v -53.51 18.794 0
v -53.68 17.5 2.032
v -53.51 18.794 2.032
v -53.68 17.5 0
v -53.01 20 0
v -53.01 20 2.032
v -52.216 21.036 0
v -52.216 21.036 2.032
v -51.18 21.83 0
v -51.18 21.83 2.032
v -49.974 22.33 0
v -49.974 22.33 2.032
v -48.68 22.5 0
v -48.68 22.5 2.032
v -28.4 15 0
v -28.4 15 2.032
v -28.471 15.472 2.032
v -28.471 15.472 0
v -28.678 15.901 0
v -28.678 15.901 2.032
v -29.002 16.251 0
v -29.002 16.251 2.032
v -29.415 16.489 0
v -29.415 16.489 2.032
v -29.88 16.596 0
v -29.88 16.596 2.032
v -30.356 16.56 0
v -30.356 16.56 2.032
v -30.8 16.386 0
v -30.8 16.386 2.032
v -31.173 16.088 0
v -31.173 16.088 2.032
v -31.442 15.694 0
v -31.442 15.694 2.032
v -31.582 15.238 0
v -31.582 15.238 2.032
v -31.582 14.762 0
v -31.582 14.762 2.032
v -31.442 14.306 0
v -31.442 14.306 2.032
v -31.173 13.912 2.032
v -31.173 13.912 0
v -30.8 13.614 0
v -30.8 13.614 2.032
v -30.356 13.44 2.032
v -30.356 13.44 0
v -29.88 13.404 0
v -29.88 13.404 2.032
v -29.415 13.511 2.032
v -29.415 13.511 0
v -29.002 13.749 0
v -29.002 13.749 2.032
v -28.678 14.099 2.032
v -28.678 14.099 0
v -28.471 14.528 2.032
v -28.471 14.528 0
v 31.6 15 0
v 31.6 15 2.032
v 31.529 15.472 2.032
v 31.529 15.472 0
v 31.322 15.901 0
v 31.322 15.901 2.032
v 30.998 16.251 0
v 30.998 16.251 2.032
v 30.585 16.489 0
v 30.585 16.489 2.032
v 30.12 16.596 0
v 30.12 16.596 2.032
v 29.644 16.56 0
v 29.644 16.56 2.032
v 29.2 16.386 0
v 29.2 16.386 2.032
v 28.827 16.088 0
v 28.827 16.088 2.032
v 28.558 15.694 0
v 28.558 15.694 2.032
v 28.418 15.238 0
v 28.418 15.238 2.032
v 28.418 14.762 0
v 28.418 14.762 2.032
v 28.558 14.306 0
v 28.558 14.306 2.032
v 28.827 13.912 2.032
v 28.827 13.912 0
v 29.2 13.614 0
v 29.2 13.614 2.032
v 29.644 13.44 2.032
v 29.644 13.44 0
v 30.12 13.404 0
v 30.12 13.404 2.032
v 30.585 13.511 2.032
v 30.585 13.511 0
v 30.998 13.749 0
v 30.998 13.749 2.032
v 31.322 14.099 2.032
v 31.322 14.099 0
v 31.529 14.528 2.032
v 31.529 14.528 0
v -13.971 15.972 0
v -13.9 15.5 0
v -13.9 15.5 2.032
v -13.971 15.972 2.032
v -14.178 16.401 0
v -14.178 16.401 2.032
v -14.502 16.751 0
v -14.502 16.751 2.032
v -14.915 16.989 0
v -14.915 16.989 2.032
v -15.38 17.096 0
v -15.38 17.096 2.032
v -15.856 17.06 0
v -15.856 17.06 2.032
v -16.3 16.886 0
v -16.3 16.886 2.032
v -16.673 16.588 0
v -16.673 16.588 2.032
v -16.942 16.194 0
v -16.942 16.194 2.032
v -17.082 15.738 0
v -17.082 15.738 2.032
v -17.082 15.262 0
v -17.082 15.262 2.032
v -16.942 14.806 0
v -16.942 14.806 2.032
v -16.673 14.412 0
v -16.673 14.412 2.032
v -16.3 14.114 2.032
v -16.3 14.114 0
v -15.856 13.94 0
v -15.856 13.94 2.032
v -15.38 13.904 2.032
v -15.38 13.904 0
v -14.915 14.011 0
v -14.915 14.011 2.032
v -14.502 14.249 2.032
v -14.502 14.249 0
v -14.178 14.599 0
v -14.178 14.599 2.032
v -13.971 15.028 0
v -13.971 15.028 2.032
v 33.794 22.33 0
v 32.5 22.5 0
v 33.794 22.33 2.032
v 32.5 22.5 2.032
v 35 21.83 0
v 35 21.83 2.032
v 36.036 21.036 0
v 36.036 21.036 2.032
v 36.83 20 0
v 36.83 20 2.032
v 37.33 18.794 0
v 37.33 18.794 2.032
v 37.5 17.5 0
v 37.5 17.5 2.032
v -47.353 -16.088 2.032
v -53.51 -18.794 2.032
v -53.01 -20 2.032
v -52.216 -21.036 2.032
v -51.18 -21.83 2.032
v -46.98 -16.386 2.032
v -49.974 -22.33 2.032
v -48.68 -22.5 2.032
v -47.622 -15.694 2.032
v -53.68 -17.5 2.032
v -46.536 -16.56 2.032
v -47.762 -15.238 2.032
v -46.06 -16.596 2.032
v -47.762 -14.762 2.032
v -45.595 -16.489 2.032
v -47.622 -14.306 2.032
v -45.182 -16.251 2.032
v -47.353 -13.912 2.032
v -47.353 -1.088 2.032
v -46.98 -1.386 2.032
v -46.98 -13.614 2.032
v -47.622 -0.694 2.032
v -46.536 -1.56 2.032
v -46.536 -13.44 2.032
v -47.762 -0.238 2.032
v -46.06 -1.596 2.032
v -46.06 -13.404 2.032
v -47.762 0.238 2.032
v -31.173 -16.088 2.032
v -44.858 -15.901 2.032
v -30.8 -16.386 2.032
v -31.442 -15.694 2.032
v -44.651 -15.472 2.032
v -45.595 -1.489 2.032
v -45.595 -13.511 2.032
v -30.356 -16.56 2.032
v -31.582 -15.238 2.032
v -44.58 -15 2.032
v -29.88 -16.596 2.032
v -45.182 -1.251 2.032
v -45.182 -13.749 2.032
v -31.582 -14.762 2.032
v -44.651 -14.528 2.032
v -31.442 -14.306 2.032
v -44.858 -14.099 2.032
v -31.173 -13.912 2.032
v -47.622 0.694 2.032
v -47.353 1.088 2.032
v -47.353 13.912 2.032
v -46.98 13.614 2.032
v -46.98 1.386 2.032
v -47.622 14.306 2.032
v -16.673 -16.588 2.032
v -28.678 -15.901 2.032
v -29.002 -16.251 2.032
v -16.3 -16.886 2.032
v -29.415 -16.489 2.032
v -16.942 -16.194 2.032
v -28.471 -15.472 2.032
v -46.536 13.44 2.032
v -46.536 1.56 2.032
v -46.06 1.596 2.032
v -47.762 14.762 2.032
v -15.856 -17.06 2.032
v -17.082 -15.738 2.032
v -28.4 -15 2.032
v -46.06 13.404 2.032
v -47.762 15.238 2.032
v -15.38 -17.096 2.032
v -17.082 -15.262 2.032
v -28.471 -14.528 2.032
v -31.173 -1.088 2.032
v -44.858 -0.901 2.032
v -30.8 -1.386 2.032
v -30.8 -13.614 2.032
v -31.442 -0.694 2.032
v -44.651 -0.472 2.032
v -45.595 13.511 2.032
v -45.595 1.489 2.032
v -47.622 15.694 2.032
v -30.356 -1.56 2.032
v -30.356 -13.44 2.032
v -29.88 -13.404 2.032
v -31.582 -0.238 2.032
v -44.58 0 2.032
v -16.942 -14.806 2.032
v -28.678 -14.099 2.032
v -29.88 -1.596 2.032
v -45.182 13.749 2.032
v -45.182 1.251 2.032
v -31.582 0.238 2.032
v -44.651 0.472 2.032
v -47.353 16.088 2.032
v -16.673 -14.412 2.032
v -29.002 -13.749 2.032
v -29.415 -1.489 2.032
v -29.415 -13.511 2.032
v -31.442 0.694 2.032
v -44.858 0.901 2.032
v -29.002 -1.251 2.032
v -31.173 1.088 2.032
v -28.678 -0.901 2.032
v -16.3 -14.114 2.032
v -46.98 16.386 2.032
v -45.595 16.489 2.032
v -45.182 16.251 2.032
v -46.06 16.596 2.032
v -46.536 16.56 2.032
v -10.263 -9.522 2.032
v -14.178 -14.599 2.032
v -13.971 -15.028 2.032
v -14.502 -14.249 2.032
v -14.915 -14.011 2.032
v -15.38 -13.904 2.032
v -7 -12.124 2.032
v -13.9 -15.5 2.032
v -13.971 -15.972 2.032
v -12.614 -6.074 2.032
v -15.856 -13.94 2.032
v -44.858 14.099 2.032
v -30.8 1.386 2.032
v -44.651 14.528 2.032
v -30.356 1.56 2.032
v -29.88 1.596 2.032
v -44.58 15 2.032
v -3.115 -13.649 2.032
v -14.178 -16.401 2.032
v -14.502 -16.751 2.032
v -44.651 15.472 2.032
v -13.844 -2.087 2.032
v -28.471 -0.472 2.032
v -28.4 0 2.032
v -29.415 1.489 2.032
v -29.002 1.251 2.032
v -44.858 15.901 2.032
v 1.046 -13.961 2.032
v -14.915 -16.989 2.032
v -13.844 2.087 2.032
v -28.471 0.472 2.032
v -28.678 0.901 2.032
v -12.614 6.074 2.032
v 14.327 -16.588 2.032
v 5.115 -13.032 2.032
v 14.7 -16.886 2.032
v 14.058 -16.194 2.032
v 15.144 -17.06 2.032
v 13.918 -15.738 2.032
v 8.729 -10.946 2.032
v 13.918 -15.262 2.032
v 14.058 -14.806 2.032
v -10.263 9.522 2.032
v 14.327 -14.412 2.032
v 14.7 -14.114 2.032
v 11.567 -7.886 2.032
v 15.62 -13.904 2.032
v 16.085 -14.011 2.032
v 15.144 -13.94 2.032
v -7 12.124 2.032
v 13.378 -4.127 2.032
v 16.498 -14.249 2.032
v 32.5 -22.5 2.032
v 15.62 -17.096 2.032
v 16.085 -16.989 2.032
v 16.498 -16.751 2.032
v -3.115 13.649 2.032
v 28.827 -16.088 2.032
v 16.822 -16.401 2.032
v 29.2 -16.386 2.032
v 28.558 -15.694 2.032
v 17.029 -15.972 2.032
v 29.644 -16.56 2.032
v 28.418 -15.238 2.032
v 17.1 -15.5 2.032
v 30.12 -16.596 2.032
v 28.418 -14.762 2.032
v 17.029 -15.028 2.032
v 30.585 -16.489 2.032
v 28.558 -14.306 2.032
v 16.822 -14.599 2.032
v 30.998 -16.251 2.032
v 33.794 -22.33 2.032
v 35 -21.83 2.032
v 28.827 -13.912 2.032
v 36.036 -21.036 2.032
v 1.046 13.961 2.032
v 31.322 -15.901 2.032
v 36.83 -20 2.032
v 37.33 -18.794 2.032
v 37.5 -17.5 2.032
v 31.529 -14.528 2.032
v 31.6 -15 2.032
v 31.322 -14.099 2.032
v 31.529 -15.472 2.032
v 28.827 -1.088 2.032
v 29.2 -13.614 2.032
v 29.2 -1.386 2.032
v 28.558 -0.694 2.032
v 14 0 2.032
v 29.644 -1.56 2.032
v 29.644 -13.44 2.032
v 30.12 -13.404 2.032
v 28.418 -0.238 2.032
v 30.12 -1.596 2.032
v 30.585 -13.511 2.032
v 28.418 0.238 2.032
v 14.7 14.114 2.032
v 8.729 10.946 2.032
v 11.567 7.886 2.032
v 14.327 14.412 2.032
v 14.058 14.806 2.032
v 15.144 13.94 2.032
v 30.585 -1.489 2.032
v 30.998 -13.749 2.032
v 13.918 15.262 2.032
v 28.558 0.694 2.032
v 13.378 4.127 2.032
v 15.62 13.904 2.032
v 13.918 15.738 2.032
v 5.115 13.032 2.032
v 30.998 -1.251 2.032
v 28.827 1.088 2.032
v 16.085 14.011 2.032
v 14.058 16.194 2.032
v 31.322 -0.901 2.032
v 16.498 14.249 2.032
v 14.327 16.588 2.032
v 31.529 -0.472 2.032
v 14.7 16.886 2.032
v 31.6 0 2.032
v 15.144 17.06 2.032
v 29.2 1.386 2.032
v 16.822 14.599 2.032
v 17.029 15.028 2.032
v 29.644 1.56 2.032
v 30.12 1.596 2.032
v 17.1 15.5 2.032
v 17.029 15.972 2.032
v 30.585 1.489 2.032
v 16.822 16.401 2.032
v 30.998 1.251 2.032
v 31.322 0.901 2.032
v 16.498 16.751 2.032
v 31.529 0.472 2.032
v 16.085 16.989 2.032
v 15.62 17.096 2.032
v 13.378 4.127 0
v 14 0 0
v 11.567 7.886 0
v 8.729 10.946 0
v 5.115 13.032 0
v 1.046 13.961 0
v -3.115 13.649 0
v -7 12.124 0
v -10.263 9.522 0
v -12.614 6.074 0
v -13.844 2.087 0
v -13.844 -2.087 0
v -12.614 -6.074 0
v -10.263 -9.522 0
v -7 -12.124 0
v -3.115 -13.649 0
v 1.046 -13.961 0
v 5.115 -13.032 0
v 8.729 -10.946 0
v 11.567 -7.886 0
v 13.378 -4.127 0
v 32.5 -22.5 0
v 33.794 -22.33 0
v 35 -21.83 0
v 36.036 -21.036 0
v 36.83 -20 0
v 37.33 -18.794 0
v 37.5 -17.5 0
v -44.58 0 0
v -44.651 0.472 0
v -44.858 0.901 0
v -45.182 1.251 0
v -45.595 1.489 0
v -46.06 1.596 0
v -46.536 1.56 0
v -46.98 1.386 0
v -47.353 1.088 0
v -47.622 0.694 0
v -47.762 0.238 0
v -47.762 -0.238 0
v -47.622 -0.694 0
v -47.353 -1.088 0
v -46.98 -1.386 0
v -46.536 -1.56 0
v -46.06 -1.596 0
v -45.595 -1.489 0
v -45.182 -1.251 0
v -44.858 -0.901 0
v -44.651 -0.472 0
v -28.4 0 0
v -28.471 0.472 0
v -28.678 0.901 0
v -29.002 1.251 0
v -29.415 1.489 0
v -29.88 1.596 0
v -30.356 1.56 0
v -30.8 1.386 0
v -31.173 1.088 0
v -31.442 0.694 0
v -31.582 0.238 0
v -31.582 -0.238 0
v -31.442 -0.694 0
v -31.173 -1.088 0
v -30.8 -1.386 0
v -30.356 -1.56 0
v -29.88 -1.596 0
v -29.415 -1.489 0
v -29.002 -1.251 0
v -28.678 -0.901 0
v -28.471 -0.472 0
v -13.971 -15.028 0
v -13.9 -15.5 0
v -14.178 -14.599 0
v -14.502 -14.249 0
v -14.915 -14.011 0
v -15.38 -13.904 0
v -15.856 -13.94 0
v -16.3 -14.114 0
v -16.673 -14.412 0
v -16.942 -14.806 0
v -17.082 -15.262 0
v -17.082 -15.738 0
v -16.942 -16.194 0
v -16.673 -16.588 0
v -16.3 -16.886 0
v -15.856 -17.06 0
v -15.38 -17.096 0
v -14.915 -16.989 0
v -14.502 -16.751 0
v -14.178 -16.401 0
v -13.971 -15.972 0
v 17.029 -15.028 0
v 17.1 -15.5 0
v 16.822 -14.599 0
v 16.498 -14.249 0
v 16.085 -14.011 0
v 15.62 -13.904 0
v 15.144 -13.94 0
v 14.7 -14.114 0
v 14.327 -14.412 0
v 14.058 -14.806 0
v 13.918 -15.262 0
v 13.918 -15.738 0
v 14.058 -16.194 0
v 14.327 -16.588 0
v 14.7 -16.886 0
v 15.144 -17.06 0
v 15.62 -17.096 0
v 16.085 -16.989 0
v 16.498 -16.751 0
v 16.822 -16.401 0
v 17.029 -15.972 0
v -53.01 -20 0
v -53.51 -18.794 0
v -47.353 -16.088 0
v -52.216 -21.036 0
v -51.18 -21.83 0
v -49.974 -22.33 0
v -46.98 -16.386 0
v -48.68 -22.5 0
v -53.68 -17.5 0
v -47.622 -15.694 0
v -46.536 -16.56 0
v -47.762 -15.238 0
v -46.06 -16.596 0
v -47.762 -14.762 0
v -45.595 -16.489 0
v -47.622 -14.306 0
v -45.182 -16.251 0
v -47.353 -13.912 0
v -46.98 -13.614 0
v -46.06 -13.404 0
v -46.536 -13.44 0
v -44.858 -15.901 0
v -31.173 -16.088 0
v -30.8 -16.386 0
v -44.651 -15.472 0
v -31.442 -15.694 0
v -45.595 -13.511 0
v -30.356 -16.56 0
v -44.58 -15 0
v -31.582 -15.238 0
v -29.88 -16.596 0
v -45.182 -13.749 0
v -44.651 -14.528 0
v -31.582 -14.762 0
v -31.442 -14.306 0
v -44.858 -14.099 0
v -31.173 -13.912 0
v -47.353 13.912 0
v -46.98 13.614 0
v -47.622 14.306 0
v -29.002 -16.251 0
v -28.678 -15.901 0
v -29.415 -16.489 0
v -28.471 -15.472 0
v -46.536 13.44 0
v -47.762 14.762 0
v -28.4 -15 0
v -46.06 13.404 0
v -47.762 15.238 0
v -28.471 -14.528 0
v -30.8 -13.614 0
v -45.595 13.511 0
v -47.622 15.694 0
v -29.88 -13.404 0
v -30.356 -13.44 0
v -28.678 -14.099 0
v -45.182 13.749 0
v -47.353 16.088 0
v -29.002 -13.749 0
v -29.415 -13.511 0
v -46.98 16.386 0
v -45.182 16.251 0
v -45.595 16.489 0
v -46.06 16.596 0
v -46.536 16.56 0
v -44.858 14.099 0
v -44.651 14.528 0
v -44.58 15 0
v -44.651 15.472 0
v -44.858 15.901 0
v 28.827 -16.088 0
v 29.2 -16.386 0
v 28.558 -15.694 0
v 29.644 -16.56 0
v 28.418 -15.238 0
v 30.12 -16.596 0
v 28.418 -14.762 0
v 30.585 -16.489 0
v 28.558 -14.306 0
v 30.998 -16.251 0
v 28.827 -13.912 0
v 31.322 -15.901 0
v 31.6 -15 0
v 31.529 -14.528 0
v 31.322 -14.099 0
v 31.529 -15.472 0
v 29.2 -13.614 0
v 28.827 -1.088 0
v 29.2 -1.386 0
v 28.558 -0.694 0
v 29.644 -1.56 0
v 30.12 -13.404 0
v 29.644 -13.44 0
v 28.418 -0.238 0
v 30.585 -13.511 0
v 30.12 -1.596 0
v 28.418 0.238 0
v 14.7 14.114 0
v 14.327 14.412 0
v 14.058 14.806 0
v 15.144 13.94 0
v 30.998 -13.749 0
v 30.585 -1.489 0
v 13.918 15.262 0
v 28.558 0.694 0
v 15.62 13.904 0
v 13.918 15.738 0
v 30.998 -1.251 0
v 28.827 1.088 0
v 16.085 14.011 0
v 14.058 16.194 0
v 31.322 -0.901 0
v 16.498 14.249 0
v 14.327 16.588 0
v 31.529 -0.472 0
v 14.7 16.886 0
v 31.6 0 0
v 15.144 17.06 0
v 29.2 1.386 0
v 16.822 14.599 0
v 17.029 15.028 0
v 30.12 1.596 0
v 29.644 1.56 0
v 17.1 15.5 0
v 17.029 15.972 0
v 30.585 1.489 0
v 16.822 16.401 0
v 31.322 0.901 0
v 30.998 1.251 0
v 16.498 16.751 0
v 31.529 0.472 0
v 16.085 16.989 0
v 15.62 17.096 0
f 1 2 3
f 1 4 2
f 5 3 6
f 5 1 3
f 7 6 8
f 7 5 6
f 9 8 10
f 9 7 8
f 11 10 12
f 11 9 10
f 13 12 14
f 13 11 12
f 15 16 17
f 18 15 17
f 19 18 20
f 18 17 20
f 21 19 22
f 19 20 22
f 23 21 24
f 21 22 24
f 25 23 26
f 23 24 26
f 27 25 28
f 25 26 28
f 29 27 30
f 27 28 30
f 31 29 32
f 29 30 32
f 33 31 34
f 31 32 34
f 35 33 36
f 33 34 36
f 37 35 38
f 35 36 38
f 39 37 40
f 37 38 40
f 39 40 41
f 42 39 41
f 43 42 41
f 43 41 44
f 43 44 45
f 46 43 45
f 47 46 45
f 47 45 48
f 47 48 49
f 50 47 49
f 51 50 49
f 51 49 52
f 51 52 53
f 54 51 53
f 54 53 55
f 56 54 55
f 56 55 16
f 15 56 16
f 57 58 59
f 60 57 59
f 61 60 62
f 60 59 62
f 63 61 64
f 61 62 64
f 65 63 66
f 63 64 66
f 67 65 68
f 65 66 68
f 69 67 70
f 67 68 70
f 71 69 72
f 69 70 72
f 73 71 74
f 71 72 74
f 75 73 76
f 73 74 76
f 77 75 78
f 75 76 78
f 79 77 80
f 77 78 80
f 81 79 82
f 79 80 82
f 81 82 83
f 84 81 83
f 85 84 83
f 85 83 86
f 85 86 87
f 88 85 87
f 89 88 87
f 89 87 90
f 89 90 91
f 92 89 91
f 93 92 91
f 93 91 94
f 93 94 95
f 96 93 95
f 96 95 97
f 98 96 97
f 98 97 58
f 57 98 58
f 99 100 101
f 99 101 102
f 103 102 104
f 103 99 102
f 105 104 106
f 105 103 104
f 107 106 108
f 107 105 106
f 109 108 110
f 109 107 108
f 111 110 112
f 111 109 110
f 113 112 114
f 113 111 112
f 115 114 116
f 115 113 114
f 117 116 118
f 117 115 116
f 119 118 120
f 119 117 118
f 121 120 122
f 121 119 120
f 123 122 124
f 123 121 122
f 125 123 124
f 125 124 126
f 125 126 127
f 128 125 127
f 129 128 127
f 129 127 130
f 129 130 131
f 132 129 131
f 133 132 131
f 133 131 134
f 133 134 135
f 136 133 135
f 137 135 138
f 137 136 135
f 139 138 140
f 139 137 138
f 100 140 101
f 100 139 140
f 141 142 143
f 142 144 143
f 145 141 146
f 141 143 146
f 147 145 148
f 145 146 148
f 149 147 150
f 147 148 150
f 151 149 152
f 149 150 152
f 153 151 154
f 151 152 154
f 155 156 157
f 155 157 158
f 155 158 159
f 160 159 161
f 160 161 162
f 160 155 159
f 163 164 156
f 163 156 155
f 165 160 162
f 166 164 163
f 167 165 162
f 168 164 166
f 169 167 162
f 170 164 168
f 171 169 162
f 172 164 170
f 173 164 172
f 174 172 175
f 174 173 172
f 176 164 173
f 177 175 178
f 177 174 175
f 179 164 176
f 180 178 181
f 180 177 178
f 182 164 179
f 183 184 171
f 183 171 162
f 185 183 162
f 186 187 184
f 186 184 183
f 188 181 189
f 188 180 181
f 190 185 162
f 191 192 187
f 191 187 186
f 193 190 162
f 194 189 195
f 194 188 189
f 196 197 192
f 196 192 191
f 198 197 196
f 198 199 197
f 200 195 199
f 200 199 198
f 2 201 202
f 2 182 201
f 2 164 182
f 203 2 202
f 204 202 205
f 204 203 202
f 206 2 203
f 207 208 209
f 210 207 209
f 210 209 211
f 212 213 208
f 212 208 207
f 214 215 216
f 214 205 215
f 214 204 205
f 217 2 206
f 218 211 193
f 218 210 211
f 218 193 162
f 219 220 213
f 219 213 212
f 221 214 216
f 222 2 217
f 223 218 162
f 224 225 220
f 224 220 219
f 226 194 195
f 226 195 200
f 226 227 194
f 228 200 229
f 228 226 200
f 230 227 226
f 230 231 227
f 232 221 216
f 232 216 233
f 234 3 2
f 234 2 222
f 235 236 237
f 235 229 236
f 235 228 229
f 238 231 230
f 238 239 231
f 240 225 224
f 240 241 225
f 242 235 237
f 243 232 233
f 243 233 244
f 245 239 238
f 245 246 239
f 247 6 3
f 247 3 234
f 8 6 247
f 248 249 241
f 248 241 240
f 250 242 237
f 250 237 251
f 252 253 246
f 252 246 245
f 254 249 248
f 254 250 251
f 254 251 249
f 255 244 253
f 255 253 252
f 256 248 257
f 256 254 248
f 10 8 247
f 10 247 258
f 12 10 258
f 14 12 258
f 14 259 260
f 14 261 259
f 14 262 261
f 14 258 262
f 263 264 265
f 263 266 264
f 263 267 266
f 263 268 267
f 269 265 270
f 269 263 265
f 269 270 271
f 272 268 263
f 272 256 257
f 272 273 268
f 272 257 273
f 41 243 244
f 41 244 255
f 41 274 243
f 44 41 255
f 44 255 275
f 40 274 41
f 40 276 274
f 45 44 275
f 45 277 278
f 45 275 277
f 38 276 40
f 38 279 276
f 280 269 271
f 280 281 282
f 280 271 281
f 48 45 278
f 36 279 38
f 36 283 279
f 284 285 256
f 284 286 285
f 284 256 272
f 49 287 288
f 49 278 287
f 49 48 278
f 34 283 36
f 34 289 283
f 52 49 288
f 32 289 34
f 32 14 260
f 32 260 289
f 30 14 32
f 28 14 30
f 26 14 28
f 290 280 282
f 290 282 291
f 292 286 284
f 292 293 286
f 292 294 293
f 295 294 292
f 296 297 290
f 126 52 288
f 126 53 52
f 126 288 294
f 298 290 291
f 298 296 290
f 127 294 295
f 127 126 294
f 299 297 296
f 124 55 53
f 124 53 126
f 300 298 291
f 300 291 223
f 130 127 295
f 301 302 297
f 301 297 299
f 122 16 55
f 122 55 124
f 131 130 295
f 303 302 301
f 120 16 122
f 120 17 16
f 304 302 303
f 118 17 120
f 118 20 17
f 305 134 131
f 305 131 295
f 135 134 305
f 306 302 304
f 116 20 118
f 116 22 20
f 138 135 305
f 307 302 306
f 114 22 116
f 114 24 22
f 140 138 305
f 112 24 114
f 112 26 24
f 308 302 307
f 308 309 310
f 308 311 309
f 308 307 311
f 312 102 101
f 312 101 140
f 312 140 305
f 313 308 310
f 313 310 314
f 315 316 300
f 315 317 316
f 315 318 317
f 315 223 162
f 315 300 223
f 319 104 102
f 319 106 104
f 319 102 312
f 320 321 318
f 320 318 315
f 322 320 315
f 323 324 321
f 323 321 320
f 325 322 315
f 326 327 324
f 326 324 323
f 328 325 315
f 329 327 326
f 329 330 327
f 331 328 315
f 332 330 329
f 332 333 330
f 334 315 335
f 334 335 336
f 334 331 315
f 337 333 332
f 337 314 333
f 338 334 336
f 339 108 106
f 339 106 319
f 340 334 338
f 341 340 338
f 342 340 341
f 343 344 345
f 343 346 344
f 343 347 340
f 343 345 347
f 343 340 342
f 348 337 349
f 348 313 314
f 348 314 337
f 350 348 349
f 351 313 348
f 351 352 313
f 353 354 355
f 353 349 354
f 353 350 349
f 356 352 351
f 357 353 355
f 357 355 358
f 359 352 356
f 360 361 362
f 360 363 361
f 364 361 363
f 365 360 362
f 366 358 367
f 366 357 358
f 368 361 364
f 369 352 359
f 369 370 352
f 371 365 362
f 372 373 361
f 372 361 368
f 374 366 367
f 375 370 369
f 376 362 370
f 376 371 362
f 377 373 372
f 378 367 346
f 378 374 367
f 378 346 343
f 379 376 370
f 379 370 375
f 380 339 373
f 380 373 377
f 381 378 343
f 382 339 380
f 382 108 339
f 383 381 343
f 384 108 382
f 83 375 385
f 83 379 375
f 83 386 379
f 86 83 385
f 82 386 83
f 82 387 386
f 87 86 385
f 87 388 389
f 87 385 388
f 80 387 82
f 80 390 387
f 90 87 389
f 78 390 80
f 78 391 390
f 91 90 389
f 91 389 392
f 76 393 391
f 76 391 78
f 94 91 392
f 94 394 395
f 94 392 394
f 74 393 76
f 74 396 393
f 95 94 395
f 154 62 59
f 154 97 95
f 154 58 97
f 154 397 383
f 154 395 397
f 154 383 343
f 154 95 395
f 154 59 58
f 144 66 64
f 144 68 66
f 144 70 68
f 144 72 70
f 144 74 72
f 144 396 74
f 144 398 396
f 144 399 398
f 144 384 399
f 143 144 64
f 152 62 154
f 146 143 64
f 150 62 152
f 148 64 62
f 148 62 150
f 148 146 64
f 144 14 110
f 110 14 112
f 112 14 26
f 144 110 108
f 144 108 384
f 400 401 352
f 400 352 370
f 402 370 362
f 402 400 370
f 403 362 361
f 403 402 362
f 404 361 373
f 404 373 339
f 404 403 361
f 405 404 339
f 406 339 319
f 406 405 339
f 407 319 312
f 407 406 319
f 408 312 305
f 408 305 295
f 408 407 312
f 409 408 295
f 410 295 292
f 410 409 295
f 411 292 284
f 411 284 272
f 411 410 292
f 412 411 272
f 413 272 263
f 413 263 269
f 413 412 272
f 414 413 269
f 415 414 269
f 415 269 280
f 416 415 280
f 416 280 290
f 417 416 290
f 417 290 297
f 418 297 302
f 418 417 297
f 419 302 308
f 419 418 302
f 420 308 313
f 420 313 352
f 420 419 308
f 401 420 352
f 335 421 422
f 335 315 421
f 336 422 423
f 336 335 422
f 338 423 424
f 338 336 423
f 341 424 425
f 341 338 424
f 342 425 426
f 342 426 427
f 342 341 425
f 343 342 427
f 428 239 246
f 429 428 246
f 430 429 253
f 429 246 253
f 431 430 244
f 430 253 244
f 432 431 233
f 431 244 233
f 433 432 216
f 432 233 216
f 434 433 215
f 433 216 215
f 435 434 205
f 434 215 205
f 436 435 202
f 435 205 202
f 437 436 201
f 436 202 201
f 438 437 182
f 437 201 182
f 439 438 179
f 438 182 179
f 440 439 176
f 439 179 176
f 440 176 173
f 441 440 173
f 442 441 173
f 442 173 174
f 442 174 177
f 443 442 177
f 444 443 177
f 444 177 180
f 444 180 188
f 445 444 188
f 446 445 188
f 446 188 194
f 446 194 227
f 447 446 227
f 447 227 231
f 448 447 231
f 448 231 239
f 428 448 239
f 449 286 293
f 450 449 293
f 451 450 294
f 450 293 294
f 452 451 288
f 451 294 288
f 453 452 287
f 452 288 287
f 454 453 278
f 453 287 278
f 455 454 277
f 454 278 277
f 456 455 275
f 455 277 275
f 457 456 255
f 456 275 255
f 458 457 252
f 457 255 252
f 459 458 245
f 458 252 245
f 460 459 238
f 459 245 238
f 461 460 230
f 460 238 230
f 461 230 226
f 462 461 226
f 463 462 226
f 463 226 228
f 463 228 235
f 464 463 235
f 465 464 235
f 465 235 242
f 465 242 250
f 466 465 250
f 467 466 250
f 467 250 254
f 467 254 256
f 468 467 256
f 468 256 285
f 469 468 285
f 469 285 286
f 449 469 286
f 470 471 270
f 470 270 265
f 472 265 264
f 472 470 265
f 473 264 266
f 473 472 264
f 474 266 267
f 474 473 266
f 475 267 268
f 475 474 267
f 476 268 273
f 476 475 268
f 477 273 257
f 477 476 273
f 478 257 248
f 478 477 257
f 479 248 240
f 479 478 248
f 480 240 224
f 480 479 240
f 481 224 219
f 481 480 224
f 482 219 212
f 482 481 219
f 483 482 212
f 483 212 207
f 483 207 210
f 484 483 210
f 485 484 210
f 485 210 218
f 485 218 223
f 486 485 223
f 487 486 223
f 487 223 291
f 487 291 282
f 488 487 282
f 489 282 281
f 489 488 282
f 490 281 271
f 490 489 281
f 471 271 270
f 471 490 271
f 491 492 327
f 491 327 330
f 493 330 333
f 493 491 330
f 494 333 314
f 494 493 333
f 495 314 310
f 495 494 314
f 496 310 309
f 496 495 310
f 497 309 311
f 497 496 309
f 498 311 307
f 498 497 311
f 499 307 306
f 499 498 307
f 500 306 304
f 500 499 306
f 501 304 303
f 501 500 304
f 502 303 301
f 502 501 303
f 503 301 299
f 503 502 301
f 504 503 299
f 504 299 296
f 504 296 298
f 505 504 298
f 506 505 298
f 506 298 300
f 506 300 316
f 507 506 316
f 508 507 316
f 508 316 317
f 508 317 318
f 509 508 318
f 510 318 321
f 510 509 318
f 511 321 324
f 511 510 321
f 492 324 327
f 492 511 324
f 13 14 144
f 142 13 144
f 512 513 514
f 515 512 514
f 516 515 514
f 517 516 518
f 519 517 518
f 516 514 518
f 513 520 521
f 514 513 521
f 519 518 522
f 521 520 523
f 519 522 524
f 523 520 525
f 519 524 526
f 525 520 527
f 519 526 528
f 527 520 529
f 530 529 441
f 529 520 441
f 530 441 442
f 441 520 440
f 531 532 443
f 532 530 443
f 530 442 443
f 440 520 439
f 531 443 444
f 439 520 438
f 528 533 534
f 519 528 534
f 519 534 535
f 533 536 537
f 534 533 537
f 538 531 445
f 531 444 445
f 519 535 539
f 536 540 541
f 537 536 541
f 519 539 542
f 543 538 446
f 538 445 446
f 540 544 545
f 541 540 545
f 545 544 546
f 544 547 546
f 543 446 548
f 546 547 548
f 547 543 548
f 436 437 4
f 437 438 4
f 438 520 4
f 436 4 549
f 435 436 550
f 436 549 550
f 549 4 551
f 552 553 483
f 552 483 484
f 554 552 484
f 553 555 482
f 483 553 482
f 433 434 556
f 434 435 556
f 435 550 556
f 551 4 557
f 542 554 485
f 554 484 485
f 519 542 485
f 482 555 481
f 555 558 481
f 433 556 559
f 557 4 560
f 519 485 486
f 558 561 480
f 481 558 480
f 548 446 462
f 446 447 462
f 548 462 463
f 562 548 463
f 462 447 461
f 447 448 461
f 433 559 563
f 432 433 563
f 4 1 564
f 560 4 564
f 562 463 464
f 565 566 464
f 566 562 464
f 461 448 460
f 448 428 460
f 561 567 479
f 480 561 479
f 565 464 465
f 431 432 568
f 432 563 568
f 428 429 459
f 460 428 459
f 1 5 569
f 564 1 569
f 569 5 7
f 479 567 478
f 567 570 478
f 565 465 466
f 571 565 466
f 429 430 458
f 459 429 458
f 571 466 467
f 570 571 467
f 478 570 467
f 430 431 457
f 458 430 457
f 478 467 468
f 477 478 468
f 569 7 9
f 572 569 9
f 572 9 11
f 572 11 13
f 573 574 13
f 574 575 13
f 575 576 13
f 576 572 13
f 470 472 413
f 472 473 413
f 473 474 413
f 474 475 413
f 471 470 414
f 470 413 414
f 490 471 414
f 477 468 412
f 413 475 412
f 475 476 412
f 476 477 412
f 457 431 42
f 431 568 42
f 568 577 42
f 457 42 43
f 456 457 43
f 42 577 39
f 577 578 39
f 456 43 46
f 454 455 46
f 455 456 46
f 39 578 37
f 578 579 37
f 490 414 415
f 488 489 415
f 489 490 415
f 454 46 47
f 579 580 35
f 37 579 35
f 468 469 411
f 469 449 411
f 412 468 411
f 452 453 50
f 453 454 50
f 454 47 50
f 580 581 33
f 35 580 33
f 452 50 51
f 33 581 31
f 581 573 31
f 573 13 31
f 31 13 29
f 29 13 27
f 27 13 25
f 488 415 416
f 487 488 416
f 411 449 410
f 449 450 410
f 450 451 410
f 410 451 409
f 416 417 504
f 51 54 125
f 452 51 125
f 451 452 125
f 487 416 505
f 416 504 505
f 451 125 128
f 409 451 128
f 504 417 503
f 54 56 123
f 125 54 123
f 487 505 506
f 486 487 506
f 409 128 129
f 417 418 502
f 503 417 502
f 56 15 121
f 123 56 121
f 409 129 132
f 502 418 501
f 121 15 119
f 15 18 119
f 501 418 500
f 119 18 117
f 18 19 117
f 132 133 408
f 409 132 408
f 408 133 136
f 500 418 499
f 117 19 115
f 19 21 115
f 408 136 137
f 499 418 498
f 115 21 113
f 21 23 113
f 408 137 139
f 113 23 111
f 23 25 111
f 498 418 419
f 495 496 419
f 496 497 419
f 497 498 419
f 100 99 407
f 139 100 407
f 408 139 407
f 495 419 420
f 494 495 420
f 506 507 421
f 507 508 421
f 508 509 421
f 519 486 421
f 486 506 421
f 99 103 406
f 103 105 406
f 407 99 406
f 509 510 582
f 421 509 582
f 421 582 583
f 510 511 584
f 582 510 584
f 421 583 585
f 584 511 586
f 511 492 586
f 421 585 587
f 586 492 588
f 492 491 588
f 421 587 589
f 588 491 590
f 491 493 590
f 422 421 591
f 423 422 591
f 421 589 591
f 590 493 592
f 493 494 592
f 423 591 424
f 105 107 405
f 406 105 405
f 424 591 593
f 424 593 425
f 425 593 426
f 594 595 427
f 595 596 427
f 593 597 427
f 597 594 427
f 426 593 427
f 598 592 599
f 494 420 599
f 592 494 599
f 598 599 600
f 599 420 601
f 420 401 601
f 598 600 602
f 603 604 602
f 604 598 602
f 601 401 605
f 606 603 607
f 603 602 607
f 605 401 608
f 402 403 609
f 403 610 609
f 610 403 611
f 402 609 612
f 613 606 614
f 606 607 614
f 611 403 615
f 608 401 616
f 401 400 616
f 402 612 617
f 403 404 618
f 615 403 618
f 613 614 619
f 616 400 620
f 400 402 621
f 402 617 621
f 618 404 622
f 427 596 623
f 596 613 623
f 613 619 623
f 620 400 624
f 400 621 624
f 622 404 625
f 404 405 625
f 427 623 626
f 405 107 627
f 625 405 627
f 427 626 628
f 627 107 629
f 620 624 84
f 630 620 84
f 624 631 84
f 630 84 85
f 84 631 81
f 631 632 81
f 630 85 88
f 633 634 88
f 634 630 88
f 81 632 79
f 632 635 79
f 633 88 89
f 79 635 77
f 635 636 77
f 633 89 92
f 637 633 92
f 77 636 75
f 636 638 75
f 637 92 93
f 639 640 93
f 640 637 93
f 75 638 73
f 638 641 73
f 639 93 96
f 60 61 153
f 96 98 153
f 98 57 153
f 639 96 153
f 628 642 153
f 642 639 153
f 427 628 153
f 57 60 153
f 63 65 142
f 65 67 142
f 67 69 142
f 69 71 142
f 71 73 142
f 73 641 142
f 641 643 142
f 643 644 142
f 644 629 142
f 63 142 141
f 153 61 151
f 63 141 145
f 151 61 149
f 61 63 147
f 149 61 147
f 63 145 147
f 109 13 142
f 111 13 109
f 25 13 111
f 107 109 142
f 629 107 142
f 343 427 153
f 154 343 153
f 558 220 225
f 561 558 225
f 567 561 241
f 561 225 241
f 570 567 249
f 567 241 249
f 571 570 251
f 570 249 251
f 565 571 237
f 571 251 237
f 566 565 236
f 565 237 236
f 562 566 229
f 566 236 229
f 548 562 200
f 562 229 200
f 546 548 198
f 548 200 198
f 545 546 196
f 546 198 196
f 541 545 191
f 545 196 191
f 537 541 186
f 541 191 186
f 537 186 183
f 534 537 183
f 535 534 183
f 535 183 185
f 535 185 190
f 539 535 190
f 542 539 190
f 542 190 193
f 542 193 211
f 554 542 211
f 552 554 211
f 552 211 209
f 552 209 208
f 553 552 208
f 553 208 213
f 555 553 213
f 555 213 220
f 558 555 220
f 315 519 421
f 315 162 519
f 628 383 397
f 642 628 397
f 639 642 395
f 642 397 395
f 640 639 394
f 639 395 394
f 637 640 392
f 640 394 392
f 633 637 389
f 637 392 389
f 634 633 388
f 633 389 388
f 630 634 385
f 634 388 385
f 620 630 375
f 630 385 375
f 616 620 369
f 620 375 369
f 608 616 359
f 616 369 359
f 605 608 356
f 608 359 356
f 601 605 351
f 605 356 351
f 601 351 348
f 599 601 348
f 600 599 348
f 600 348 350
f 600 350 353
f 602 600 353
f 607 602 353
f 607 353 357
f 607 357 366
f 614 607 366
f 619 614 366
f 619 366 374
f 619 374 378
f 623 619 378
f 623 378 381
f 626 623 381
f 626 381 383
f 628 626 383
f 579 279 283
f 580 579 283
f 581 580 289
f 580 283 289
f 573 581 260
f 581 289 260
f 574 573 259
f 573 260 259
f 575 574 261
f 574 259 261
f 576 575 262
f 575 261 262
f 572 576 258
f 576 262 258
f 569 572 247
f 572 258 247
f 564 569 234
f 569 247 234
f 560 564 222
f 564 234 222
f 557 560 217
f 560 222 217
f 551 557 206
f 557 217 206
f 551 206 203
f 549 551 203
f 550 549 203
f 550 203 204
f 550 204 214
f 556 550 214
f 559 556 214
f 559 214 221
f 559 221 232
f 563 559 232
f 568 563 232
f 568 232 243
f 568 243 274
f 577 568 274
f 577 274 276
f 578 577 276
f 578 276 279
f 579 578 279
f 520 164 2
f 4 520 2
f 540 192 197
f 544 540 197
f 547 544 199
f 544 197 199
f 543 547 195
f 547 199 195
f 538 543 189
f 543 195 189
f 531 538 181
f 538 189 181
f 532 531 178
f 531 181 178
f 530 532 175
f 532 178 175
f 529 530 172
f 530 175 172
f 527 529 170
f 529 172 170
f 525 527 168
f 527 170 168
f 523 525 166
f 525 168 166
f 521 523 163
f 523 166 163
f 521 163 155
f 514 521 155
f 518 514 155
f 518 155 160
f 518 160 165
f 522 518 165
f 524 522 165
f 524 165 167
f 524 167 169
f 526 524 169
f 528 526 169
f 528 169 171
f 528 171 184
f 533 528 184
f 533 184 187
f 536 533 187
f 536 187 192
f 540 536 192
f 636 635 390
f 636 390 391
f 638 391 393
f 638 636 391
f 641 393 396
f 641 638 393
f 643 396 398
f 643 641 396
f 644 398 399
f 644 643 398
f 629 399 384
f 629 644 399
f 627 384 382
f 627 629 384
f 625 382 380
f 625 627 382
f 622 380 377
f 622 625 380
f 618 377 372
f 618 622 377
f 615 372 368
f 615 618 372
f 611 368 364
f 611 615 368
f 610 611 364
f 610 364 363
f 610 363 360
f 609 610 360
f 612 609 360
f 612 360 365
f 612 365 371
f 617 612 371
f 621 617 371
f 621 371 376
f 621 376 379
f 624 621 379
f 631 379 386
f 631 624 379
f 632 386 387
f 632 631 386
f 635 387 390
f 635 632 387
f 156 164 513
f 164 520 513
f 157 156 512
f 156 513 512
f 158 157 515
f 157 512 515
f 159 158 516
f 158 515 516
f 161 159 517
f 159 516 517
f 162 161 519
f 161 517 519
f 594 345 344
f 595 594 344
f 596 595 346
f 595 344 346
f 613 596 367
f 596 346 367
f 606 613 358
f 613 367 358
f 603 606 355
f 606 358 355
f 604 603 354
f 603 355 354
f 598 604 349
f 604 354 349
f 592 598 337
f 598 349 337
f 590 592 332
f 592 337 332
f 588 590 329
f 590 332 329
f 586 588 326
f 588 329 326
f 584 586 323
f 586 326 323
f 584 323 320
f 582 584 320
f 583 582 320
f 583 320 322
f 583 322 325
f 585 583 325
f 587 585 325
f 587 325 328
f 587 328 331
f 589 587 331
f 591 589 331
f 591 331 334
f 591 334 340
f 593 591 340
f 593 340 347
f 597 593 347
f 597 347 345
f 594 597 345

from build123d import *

# Parameters (mm, degrees)
SKETCH1_W           = 75
SKETCH1_H           = 45
SKETCH1_R           = 14
SKETCH1_R_2         = 1.6
BOSS_EXTRUDE1_DEPTH = 2.032
FILLET2_R           = 5
SKETCH2_R           = 1.6
CUT_EXTRUDE1_DEPTH  = 3.032
SKETCH5_W           = 21.294776471
SKETCH5_H           = 45
BOSS_EXTRUDE3_DEPTH = 2.032
FILLET3_R           = 5
SKETCH6_R           = 1.6
CUT_EXTRUDE2_DEPTH  = 3.032


with BuildPart() as part:
    # Sketch1 → Boss-Extrude1 (new body)
    with BuildSketch(Plane.XY):
        Rectangle(SKETCH1_W, SKETCH1_H)
        Circle(SKETCH1_R, mode=Mode.SUBTRACT)
        with Locations((-15.5, 15.5)):
            Circle(SKETCH1_R_2, mode=Mode.SUBTRACT)
        with Locations((15.5, 15.5)):
            Circle(SKETCH1_R_2, mode=Mode.SUBTRACT)
        with Locations((15.5, -15.5)):
            Circle(SKETCH1_R_2, mode=Mode.SUBTRACT)
        with Locations((-15.5, -15.5)):
            Circle(SKETCH1_R_2, mode=Mode.SUBTRACT)
    extrude(amount=BOSS_EXTRUDE1_DEPTH)

    # Fillet2
    fillet2_edges = [part.edges().sort_by_distance(p)[0] for p in [
        (37.5, -22.5, 1.016),
        (-37.5, -22.5, 1.016),
        (-37.5, 22.5, 1.016),
        (37.5, 22.5, 1.016),
    ]]
    fillet(fillet2_edges, radius=FILLET2_R)

    # Sketch2 → Cut-Extrude1 (cut, through all)
    with BuildSketch(Plane.XY.offset(2.032)):
        with Locations((-30, 0)):
            Circle(SKETCH2_R)
        with Locations((-30, 15)):
            Circle(SKETCH2_R)
        with Locations((-30, -15)):
            Circle(SKETCH2_R)
        with Locations((30, -15)):
            Circle(SKETCH2_R)
        with Locations((30, 15)):
            Circle(SKETCH2_R)
        with Locations((30, 0)):
            Circle(SKETCH2_R)
    extrude(amount=-CUT_EXTRUDE1_DEPTH, mode=Mode.SUBTRACT)

    # Sketch5 → Boss-Extrude3 (add)
    with BuildSketch(Plane.XY.offset(2.032)):
        with Locations((-43.032611765, 0)):
            Rectangle(SKETCH5_W, SKETCH5_H)
    extrude(amount=-BOSS_EXTRUDE3_DEPTH)

    # Fillet3
    fillet3_edges = [part.edges().sort_by_distance(p)[0] for p in [
        (-53.68, 22.5, 1.016),
        (-53.68, -22.5, 1.016),
    ]]
    fillet(fillet3_edges, radius=FILLET3_R)

    # Sketch6 → Cut-Extrude2 (cut, through all)
    with BuildSketch(Plane.XY.offset(2.032)):
        with Locations((-46.18, 15)):
            Circle(SKETCH6_R)
        with Locations((-46.18, 0)):
            Circle(SKETCH6_R)
        with Locations((-46.18, -15)):
            Circle(SKETCH6_R)
    extrude(amount=-CUT_EXTRUDE2_DEPTH, mode=Mode.SUBTRACT)


solid = part.part
